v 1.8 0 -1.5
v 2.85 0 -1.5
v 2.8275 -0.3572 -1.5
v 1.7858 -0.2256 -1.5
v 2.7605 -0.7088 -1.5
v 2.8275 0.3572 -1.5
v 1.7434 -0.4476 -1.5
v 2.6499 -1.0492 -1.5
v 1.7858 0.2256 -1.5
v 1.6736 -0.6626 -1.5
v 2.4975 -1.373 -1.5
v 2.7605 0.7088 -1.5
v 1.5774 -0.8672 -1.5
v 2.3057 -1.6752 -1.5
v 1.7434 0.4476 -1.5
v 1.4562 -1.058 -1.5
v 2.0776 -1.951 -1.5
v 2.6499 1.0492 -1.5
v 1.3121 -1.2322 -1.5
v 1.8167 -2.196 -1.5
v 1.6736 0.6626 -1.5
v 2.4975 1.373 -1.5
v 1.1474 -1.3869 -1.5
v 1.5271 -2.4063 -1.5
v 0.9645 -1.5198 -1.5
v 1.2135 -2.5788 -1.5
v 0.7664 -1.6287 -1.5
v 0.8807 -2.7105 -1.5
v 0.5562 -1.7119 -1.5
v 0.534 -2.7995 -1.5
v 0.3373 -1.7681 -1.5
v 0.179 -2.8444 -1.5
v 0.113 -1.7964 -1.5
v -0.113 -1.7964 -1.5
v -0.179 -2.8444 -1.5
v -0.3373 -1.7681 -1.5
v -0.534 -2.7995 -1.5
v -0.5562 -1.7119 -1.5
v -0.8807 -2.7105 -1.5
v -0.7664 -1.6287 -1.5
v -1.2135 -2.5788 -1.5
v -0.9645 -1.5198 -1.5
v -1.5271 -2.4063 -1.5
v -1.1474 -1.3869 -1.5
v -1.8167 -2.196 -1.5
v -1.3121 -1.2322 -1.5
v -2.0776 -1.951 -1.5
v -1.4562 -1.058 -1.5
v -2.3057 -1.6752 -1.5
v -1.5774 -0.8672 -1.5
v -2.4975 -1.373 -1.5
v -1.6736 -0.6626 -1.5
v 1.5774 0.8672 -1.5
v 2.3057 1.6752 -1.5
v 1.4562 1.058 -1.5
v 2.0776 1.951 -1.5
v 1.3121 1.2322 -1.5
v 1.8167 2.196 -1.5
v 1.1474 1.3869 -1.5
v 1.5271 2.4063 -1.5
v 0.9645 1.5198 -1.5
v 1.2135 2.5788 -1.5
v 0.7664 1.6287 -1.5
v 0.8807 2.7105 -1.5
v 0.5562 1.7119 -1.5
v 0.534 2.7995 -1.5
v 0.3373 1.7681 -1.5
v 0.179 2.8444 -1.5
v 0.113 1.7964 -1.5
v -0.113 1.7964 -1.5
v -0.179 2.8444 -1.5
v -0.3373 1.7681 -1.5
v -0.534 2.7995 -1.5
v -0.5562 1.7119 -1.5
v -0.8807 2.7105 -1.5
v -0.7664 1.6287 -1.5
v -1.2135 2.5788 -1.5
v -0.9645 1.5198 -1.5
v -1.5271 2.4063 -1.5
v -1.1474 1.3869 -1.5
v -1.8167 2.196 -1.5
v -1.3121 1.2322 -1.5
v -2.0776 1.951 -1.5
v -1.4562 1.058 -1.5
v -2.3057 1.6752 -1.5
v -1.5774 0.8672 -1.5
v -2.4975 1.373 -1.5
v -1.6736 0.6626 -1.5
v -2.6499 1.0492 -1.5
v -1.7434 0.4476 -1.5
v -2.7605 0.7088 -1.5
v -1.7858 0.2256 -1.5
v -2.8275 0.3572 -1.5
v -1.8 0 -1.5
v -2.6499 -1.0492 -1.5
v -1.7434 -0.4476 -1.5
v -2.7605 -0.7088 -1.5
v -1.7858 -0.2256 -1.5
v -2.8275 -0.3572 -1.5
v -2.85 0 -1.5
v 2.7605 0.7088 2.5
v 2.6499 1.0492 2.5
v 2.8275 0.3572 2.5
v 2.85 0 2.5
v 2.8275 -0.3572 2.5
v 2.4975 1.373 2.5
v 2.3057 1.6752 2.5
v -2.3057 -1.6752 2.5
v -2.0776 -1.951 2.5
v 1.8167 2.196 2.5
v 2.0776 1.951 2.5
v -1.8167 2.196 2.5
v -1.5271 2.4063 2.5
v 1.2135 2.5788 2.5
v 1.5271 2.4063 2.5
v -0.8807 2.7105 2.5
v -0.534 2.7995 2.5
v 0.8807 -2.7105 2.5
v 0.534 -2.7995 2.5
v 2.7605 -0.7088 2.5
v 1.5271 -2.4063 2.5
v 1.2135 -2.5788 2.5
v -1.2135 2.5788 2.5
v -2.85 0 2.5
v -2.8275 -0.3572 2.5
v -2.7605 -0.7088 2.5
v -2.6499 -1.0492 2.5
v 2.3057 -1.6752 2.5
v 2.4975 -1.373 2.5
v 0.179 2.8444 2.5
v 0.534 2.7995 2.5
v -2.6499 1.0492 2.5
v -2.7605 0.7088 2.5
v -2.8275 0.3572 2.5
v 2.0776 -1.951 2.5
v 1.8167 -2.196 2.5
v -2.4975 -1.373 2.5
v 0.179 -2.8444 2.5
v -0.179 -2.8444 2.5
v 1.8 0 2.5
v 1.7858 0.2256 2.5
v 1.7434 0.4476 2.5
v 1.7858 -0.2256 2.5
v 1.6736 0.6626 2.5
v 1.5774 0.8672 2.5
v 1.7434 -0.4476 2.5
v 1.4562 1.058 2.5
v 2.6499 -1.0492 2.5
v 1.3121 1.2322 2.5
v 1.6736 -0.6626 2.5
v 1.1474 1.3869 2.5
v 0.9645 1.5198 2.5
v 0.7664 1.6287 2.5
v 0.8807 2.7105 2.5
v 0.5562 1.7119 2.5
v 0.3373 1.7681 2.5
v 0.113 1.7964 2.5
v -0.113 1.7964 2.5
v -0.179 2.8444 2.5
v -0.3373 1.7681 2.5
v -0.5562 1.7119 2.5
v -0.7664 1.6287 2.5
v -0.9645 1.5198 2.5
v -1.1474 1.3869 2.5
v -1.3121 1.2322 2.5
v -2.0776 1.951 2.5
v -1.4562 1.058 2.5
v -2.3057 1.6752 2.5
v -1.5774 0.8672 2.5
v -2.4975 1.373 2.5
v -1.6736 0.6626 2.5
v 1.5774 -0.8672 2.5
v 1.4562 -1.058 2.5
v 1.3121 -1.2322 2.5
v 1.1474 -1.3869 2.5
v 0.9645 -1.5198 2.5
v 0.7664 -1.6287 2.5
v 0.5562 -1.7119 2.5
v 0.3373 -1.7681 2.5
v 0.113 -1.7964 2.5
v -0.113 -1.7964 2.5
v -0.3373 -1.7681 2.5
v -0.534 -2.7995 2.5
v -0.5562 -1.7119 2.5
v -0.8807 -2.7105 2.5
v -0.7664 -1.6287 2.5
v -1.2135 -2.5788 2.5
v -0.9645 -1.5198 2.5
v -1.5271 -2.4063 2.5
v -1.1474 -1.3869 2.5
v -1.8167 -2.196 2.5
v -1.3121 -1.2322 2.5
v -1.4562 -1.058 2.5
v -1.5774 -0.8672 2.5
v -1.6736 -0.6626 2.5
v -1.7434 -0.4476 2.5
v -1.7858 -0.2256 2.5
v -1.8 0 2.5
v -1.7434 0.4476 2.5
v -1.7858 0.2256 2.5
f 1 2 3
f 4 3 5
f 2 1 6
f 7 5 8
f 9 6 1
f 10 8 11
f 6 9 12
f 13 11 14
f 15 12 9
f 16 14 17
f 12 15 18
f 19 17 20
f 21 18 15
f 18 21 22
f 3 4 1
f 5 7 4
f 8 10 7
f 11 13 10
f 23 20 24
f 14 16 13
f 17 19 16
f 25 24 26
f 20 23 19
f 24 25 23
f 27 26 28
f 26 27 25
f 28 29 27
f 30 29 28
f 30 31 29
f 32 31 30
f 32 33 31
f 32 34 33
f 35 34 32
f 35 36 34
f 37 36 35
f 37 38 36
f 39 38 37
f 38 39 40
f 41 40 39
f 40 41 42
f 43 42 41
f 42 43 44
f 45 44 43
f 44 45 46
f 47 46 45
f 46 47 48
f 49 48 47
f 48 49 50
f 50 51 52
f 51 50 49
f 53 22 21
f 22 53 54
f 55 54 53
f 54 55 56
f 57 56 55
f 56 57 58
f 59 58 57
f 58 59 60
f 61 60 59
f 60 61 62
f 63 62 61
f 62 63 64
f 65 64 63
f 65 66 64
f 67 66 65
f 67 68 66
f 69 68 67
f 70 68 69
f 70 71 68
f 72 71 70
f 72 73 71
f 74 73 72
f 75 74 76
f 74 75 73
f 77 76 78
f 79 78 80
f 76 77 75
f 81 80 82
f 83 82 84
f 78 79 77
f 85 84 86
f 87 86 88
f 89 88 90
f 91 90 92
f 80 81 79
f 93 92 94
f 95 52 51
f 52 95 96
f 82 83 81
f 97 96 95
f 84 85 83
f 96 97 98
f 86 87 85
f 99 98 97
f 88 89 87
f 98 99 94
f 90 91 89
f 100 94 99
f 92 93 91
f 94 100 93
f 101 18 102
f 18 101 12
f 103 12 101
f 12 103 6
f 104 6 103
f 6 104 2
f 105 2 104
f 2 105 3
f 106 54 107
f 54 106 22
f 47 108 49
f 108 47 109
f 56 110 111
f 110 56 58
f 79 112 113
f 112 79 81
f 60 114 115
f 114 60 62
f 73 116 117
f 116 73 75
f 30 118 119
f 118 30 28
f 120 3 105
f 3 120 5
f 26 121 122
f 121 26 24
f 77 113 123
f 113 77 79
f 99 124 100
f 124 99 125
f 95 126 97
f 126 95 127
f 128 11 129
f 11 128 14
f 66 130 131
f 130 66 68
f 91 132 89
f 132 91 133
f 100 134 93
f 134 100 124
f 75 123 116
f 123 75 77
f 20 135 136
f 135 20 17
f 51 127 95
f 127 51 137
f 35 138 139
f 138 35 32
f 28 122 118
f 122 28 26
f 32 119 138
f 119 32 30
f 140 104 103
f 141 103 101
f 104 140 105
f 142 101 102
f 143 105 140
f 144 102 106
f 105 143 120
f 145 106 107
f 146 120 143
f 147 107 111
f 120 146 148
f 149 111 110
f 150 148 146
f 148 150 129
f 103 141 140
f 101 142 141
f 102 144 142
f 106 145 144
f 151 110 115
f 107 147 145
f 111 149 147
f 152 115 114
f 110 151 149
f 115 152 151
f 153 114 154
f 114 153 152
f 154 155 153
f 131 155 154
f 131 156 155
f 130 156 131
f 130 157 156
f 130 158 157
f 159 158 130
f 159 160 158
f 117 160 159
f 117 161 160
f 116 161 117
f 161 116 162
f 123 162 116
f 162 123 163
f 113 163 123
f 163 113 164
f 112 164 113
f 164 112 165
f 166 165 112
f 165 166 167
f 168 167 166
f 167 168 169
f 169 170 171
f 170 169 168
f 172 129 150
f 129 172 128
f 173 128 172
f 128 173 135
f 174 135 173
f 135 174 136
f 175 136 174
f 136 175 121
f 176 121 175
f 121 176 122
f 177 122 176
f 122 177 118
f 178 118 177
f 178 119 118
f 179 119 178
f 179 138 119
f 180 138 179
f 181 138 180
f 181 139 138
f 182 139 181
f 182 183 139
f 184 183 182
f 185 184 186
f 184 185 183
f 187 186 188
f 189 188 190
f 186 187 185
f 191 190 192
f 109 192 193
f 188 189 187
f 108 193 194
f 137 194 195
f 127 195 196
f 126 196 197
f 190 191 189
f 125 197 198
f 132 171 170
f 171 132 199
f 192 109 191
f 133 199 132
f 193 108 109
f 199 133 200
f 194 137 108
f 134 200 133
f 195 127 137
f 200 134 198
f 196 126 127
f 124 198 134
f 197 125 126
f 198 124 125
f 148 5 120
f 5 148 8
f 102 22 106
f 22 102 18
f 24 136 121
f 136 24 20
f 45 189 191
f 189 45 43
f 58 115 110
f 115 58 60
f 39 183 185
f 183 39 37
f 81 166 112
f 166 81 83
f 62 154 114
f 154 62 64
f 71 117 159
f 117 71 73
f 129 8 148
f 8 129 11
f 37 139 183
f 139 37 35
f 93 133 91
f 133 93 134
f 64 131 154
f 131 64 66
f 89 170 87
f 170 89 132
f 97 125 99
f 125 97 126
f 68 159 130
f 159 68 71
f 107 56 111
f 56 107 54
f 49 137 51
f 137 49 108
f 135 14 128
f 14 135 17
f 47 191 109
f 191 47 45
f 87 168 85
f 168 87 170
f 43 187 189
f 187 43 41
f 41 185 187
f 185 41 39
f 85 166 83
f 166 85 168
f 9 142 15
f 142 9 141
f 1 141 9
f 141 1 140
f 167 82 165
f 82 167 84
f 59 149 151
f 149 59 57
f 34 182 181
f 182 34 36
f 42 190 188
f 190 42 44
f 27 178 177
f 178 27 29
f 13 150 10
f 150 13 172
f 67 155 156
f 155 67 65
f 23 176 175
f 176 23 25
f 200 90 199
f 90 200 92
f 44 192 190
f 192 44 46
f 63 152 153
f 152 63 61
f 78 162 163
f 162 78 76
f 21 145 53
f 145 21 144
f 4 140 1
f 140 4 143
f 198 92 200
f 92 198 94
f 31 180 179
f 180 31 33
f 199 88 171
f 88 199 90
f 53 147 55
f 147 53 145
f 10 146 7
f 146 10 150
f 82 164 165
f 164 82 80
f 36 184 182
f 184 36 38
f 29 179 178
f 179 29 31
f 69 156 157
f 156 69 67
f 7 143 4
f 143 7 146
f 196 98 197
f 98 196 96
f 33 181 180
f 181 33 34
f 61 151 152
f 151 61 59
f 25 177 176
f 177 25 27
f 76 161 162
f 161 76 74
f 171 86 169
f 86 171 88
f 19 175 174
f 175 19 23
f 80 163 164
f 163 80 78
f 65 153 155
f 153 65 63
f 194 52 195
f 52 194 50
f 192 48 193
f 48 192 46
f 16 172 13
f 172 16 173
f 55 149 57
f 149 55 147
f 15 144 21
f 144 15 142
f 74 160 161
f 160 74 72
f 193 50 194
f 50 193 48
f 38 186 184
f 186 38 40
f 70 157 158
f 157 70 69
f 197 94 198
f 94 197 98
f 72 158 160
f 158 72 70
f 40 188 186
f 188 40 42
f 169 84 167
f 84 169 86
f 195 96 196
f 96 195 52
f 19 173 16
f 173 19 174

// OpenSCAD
$fn = 50;


difference() {
	union() {
		translate(v = [0, 0, -1.5000000000]) {
			cylinder(h = 3, r = 1.0000000000);
		}
		translate(v = [0, 0, -1.5000000000]) {
			cylinder(h = 4, r = 2.8500000000);
		}
	}
	union() {
		translate(v = [0, 0, -50.0000000000]) {
			cylinder(h = 100, r = 1.8000000000);
		}
	}
}
